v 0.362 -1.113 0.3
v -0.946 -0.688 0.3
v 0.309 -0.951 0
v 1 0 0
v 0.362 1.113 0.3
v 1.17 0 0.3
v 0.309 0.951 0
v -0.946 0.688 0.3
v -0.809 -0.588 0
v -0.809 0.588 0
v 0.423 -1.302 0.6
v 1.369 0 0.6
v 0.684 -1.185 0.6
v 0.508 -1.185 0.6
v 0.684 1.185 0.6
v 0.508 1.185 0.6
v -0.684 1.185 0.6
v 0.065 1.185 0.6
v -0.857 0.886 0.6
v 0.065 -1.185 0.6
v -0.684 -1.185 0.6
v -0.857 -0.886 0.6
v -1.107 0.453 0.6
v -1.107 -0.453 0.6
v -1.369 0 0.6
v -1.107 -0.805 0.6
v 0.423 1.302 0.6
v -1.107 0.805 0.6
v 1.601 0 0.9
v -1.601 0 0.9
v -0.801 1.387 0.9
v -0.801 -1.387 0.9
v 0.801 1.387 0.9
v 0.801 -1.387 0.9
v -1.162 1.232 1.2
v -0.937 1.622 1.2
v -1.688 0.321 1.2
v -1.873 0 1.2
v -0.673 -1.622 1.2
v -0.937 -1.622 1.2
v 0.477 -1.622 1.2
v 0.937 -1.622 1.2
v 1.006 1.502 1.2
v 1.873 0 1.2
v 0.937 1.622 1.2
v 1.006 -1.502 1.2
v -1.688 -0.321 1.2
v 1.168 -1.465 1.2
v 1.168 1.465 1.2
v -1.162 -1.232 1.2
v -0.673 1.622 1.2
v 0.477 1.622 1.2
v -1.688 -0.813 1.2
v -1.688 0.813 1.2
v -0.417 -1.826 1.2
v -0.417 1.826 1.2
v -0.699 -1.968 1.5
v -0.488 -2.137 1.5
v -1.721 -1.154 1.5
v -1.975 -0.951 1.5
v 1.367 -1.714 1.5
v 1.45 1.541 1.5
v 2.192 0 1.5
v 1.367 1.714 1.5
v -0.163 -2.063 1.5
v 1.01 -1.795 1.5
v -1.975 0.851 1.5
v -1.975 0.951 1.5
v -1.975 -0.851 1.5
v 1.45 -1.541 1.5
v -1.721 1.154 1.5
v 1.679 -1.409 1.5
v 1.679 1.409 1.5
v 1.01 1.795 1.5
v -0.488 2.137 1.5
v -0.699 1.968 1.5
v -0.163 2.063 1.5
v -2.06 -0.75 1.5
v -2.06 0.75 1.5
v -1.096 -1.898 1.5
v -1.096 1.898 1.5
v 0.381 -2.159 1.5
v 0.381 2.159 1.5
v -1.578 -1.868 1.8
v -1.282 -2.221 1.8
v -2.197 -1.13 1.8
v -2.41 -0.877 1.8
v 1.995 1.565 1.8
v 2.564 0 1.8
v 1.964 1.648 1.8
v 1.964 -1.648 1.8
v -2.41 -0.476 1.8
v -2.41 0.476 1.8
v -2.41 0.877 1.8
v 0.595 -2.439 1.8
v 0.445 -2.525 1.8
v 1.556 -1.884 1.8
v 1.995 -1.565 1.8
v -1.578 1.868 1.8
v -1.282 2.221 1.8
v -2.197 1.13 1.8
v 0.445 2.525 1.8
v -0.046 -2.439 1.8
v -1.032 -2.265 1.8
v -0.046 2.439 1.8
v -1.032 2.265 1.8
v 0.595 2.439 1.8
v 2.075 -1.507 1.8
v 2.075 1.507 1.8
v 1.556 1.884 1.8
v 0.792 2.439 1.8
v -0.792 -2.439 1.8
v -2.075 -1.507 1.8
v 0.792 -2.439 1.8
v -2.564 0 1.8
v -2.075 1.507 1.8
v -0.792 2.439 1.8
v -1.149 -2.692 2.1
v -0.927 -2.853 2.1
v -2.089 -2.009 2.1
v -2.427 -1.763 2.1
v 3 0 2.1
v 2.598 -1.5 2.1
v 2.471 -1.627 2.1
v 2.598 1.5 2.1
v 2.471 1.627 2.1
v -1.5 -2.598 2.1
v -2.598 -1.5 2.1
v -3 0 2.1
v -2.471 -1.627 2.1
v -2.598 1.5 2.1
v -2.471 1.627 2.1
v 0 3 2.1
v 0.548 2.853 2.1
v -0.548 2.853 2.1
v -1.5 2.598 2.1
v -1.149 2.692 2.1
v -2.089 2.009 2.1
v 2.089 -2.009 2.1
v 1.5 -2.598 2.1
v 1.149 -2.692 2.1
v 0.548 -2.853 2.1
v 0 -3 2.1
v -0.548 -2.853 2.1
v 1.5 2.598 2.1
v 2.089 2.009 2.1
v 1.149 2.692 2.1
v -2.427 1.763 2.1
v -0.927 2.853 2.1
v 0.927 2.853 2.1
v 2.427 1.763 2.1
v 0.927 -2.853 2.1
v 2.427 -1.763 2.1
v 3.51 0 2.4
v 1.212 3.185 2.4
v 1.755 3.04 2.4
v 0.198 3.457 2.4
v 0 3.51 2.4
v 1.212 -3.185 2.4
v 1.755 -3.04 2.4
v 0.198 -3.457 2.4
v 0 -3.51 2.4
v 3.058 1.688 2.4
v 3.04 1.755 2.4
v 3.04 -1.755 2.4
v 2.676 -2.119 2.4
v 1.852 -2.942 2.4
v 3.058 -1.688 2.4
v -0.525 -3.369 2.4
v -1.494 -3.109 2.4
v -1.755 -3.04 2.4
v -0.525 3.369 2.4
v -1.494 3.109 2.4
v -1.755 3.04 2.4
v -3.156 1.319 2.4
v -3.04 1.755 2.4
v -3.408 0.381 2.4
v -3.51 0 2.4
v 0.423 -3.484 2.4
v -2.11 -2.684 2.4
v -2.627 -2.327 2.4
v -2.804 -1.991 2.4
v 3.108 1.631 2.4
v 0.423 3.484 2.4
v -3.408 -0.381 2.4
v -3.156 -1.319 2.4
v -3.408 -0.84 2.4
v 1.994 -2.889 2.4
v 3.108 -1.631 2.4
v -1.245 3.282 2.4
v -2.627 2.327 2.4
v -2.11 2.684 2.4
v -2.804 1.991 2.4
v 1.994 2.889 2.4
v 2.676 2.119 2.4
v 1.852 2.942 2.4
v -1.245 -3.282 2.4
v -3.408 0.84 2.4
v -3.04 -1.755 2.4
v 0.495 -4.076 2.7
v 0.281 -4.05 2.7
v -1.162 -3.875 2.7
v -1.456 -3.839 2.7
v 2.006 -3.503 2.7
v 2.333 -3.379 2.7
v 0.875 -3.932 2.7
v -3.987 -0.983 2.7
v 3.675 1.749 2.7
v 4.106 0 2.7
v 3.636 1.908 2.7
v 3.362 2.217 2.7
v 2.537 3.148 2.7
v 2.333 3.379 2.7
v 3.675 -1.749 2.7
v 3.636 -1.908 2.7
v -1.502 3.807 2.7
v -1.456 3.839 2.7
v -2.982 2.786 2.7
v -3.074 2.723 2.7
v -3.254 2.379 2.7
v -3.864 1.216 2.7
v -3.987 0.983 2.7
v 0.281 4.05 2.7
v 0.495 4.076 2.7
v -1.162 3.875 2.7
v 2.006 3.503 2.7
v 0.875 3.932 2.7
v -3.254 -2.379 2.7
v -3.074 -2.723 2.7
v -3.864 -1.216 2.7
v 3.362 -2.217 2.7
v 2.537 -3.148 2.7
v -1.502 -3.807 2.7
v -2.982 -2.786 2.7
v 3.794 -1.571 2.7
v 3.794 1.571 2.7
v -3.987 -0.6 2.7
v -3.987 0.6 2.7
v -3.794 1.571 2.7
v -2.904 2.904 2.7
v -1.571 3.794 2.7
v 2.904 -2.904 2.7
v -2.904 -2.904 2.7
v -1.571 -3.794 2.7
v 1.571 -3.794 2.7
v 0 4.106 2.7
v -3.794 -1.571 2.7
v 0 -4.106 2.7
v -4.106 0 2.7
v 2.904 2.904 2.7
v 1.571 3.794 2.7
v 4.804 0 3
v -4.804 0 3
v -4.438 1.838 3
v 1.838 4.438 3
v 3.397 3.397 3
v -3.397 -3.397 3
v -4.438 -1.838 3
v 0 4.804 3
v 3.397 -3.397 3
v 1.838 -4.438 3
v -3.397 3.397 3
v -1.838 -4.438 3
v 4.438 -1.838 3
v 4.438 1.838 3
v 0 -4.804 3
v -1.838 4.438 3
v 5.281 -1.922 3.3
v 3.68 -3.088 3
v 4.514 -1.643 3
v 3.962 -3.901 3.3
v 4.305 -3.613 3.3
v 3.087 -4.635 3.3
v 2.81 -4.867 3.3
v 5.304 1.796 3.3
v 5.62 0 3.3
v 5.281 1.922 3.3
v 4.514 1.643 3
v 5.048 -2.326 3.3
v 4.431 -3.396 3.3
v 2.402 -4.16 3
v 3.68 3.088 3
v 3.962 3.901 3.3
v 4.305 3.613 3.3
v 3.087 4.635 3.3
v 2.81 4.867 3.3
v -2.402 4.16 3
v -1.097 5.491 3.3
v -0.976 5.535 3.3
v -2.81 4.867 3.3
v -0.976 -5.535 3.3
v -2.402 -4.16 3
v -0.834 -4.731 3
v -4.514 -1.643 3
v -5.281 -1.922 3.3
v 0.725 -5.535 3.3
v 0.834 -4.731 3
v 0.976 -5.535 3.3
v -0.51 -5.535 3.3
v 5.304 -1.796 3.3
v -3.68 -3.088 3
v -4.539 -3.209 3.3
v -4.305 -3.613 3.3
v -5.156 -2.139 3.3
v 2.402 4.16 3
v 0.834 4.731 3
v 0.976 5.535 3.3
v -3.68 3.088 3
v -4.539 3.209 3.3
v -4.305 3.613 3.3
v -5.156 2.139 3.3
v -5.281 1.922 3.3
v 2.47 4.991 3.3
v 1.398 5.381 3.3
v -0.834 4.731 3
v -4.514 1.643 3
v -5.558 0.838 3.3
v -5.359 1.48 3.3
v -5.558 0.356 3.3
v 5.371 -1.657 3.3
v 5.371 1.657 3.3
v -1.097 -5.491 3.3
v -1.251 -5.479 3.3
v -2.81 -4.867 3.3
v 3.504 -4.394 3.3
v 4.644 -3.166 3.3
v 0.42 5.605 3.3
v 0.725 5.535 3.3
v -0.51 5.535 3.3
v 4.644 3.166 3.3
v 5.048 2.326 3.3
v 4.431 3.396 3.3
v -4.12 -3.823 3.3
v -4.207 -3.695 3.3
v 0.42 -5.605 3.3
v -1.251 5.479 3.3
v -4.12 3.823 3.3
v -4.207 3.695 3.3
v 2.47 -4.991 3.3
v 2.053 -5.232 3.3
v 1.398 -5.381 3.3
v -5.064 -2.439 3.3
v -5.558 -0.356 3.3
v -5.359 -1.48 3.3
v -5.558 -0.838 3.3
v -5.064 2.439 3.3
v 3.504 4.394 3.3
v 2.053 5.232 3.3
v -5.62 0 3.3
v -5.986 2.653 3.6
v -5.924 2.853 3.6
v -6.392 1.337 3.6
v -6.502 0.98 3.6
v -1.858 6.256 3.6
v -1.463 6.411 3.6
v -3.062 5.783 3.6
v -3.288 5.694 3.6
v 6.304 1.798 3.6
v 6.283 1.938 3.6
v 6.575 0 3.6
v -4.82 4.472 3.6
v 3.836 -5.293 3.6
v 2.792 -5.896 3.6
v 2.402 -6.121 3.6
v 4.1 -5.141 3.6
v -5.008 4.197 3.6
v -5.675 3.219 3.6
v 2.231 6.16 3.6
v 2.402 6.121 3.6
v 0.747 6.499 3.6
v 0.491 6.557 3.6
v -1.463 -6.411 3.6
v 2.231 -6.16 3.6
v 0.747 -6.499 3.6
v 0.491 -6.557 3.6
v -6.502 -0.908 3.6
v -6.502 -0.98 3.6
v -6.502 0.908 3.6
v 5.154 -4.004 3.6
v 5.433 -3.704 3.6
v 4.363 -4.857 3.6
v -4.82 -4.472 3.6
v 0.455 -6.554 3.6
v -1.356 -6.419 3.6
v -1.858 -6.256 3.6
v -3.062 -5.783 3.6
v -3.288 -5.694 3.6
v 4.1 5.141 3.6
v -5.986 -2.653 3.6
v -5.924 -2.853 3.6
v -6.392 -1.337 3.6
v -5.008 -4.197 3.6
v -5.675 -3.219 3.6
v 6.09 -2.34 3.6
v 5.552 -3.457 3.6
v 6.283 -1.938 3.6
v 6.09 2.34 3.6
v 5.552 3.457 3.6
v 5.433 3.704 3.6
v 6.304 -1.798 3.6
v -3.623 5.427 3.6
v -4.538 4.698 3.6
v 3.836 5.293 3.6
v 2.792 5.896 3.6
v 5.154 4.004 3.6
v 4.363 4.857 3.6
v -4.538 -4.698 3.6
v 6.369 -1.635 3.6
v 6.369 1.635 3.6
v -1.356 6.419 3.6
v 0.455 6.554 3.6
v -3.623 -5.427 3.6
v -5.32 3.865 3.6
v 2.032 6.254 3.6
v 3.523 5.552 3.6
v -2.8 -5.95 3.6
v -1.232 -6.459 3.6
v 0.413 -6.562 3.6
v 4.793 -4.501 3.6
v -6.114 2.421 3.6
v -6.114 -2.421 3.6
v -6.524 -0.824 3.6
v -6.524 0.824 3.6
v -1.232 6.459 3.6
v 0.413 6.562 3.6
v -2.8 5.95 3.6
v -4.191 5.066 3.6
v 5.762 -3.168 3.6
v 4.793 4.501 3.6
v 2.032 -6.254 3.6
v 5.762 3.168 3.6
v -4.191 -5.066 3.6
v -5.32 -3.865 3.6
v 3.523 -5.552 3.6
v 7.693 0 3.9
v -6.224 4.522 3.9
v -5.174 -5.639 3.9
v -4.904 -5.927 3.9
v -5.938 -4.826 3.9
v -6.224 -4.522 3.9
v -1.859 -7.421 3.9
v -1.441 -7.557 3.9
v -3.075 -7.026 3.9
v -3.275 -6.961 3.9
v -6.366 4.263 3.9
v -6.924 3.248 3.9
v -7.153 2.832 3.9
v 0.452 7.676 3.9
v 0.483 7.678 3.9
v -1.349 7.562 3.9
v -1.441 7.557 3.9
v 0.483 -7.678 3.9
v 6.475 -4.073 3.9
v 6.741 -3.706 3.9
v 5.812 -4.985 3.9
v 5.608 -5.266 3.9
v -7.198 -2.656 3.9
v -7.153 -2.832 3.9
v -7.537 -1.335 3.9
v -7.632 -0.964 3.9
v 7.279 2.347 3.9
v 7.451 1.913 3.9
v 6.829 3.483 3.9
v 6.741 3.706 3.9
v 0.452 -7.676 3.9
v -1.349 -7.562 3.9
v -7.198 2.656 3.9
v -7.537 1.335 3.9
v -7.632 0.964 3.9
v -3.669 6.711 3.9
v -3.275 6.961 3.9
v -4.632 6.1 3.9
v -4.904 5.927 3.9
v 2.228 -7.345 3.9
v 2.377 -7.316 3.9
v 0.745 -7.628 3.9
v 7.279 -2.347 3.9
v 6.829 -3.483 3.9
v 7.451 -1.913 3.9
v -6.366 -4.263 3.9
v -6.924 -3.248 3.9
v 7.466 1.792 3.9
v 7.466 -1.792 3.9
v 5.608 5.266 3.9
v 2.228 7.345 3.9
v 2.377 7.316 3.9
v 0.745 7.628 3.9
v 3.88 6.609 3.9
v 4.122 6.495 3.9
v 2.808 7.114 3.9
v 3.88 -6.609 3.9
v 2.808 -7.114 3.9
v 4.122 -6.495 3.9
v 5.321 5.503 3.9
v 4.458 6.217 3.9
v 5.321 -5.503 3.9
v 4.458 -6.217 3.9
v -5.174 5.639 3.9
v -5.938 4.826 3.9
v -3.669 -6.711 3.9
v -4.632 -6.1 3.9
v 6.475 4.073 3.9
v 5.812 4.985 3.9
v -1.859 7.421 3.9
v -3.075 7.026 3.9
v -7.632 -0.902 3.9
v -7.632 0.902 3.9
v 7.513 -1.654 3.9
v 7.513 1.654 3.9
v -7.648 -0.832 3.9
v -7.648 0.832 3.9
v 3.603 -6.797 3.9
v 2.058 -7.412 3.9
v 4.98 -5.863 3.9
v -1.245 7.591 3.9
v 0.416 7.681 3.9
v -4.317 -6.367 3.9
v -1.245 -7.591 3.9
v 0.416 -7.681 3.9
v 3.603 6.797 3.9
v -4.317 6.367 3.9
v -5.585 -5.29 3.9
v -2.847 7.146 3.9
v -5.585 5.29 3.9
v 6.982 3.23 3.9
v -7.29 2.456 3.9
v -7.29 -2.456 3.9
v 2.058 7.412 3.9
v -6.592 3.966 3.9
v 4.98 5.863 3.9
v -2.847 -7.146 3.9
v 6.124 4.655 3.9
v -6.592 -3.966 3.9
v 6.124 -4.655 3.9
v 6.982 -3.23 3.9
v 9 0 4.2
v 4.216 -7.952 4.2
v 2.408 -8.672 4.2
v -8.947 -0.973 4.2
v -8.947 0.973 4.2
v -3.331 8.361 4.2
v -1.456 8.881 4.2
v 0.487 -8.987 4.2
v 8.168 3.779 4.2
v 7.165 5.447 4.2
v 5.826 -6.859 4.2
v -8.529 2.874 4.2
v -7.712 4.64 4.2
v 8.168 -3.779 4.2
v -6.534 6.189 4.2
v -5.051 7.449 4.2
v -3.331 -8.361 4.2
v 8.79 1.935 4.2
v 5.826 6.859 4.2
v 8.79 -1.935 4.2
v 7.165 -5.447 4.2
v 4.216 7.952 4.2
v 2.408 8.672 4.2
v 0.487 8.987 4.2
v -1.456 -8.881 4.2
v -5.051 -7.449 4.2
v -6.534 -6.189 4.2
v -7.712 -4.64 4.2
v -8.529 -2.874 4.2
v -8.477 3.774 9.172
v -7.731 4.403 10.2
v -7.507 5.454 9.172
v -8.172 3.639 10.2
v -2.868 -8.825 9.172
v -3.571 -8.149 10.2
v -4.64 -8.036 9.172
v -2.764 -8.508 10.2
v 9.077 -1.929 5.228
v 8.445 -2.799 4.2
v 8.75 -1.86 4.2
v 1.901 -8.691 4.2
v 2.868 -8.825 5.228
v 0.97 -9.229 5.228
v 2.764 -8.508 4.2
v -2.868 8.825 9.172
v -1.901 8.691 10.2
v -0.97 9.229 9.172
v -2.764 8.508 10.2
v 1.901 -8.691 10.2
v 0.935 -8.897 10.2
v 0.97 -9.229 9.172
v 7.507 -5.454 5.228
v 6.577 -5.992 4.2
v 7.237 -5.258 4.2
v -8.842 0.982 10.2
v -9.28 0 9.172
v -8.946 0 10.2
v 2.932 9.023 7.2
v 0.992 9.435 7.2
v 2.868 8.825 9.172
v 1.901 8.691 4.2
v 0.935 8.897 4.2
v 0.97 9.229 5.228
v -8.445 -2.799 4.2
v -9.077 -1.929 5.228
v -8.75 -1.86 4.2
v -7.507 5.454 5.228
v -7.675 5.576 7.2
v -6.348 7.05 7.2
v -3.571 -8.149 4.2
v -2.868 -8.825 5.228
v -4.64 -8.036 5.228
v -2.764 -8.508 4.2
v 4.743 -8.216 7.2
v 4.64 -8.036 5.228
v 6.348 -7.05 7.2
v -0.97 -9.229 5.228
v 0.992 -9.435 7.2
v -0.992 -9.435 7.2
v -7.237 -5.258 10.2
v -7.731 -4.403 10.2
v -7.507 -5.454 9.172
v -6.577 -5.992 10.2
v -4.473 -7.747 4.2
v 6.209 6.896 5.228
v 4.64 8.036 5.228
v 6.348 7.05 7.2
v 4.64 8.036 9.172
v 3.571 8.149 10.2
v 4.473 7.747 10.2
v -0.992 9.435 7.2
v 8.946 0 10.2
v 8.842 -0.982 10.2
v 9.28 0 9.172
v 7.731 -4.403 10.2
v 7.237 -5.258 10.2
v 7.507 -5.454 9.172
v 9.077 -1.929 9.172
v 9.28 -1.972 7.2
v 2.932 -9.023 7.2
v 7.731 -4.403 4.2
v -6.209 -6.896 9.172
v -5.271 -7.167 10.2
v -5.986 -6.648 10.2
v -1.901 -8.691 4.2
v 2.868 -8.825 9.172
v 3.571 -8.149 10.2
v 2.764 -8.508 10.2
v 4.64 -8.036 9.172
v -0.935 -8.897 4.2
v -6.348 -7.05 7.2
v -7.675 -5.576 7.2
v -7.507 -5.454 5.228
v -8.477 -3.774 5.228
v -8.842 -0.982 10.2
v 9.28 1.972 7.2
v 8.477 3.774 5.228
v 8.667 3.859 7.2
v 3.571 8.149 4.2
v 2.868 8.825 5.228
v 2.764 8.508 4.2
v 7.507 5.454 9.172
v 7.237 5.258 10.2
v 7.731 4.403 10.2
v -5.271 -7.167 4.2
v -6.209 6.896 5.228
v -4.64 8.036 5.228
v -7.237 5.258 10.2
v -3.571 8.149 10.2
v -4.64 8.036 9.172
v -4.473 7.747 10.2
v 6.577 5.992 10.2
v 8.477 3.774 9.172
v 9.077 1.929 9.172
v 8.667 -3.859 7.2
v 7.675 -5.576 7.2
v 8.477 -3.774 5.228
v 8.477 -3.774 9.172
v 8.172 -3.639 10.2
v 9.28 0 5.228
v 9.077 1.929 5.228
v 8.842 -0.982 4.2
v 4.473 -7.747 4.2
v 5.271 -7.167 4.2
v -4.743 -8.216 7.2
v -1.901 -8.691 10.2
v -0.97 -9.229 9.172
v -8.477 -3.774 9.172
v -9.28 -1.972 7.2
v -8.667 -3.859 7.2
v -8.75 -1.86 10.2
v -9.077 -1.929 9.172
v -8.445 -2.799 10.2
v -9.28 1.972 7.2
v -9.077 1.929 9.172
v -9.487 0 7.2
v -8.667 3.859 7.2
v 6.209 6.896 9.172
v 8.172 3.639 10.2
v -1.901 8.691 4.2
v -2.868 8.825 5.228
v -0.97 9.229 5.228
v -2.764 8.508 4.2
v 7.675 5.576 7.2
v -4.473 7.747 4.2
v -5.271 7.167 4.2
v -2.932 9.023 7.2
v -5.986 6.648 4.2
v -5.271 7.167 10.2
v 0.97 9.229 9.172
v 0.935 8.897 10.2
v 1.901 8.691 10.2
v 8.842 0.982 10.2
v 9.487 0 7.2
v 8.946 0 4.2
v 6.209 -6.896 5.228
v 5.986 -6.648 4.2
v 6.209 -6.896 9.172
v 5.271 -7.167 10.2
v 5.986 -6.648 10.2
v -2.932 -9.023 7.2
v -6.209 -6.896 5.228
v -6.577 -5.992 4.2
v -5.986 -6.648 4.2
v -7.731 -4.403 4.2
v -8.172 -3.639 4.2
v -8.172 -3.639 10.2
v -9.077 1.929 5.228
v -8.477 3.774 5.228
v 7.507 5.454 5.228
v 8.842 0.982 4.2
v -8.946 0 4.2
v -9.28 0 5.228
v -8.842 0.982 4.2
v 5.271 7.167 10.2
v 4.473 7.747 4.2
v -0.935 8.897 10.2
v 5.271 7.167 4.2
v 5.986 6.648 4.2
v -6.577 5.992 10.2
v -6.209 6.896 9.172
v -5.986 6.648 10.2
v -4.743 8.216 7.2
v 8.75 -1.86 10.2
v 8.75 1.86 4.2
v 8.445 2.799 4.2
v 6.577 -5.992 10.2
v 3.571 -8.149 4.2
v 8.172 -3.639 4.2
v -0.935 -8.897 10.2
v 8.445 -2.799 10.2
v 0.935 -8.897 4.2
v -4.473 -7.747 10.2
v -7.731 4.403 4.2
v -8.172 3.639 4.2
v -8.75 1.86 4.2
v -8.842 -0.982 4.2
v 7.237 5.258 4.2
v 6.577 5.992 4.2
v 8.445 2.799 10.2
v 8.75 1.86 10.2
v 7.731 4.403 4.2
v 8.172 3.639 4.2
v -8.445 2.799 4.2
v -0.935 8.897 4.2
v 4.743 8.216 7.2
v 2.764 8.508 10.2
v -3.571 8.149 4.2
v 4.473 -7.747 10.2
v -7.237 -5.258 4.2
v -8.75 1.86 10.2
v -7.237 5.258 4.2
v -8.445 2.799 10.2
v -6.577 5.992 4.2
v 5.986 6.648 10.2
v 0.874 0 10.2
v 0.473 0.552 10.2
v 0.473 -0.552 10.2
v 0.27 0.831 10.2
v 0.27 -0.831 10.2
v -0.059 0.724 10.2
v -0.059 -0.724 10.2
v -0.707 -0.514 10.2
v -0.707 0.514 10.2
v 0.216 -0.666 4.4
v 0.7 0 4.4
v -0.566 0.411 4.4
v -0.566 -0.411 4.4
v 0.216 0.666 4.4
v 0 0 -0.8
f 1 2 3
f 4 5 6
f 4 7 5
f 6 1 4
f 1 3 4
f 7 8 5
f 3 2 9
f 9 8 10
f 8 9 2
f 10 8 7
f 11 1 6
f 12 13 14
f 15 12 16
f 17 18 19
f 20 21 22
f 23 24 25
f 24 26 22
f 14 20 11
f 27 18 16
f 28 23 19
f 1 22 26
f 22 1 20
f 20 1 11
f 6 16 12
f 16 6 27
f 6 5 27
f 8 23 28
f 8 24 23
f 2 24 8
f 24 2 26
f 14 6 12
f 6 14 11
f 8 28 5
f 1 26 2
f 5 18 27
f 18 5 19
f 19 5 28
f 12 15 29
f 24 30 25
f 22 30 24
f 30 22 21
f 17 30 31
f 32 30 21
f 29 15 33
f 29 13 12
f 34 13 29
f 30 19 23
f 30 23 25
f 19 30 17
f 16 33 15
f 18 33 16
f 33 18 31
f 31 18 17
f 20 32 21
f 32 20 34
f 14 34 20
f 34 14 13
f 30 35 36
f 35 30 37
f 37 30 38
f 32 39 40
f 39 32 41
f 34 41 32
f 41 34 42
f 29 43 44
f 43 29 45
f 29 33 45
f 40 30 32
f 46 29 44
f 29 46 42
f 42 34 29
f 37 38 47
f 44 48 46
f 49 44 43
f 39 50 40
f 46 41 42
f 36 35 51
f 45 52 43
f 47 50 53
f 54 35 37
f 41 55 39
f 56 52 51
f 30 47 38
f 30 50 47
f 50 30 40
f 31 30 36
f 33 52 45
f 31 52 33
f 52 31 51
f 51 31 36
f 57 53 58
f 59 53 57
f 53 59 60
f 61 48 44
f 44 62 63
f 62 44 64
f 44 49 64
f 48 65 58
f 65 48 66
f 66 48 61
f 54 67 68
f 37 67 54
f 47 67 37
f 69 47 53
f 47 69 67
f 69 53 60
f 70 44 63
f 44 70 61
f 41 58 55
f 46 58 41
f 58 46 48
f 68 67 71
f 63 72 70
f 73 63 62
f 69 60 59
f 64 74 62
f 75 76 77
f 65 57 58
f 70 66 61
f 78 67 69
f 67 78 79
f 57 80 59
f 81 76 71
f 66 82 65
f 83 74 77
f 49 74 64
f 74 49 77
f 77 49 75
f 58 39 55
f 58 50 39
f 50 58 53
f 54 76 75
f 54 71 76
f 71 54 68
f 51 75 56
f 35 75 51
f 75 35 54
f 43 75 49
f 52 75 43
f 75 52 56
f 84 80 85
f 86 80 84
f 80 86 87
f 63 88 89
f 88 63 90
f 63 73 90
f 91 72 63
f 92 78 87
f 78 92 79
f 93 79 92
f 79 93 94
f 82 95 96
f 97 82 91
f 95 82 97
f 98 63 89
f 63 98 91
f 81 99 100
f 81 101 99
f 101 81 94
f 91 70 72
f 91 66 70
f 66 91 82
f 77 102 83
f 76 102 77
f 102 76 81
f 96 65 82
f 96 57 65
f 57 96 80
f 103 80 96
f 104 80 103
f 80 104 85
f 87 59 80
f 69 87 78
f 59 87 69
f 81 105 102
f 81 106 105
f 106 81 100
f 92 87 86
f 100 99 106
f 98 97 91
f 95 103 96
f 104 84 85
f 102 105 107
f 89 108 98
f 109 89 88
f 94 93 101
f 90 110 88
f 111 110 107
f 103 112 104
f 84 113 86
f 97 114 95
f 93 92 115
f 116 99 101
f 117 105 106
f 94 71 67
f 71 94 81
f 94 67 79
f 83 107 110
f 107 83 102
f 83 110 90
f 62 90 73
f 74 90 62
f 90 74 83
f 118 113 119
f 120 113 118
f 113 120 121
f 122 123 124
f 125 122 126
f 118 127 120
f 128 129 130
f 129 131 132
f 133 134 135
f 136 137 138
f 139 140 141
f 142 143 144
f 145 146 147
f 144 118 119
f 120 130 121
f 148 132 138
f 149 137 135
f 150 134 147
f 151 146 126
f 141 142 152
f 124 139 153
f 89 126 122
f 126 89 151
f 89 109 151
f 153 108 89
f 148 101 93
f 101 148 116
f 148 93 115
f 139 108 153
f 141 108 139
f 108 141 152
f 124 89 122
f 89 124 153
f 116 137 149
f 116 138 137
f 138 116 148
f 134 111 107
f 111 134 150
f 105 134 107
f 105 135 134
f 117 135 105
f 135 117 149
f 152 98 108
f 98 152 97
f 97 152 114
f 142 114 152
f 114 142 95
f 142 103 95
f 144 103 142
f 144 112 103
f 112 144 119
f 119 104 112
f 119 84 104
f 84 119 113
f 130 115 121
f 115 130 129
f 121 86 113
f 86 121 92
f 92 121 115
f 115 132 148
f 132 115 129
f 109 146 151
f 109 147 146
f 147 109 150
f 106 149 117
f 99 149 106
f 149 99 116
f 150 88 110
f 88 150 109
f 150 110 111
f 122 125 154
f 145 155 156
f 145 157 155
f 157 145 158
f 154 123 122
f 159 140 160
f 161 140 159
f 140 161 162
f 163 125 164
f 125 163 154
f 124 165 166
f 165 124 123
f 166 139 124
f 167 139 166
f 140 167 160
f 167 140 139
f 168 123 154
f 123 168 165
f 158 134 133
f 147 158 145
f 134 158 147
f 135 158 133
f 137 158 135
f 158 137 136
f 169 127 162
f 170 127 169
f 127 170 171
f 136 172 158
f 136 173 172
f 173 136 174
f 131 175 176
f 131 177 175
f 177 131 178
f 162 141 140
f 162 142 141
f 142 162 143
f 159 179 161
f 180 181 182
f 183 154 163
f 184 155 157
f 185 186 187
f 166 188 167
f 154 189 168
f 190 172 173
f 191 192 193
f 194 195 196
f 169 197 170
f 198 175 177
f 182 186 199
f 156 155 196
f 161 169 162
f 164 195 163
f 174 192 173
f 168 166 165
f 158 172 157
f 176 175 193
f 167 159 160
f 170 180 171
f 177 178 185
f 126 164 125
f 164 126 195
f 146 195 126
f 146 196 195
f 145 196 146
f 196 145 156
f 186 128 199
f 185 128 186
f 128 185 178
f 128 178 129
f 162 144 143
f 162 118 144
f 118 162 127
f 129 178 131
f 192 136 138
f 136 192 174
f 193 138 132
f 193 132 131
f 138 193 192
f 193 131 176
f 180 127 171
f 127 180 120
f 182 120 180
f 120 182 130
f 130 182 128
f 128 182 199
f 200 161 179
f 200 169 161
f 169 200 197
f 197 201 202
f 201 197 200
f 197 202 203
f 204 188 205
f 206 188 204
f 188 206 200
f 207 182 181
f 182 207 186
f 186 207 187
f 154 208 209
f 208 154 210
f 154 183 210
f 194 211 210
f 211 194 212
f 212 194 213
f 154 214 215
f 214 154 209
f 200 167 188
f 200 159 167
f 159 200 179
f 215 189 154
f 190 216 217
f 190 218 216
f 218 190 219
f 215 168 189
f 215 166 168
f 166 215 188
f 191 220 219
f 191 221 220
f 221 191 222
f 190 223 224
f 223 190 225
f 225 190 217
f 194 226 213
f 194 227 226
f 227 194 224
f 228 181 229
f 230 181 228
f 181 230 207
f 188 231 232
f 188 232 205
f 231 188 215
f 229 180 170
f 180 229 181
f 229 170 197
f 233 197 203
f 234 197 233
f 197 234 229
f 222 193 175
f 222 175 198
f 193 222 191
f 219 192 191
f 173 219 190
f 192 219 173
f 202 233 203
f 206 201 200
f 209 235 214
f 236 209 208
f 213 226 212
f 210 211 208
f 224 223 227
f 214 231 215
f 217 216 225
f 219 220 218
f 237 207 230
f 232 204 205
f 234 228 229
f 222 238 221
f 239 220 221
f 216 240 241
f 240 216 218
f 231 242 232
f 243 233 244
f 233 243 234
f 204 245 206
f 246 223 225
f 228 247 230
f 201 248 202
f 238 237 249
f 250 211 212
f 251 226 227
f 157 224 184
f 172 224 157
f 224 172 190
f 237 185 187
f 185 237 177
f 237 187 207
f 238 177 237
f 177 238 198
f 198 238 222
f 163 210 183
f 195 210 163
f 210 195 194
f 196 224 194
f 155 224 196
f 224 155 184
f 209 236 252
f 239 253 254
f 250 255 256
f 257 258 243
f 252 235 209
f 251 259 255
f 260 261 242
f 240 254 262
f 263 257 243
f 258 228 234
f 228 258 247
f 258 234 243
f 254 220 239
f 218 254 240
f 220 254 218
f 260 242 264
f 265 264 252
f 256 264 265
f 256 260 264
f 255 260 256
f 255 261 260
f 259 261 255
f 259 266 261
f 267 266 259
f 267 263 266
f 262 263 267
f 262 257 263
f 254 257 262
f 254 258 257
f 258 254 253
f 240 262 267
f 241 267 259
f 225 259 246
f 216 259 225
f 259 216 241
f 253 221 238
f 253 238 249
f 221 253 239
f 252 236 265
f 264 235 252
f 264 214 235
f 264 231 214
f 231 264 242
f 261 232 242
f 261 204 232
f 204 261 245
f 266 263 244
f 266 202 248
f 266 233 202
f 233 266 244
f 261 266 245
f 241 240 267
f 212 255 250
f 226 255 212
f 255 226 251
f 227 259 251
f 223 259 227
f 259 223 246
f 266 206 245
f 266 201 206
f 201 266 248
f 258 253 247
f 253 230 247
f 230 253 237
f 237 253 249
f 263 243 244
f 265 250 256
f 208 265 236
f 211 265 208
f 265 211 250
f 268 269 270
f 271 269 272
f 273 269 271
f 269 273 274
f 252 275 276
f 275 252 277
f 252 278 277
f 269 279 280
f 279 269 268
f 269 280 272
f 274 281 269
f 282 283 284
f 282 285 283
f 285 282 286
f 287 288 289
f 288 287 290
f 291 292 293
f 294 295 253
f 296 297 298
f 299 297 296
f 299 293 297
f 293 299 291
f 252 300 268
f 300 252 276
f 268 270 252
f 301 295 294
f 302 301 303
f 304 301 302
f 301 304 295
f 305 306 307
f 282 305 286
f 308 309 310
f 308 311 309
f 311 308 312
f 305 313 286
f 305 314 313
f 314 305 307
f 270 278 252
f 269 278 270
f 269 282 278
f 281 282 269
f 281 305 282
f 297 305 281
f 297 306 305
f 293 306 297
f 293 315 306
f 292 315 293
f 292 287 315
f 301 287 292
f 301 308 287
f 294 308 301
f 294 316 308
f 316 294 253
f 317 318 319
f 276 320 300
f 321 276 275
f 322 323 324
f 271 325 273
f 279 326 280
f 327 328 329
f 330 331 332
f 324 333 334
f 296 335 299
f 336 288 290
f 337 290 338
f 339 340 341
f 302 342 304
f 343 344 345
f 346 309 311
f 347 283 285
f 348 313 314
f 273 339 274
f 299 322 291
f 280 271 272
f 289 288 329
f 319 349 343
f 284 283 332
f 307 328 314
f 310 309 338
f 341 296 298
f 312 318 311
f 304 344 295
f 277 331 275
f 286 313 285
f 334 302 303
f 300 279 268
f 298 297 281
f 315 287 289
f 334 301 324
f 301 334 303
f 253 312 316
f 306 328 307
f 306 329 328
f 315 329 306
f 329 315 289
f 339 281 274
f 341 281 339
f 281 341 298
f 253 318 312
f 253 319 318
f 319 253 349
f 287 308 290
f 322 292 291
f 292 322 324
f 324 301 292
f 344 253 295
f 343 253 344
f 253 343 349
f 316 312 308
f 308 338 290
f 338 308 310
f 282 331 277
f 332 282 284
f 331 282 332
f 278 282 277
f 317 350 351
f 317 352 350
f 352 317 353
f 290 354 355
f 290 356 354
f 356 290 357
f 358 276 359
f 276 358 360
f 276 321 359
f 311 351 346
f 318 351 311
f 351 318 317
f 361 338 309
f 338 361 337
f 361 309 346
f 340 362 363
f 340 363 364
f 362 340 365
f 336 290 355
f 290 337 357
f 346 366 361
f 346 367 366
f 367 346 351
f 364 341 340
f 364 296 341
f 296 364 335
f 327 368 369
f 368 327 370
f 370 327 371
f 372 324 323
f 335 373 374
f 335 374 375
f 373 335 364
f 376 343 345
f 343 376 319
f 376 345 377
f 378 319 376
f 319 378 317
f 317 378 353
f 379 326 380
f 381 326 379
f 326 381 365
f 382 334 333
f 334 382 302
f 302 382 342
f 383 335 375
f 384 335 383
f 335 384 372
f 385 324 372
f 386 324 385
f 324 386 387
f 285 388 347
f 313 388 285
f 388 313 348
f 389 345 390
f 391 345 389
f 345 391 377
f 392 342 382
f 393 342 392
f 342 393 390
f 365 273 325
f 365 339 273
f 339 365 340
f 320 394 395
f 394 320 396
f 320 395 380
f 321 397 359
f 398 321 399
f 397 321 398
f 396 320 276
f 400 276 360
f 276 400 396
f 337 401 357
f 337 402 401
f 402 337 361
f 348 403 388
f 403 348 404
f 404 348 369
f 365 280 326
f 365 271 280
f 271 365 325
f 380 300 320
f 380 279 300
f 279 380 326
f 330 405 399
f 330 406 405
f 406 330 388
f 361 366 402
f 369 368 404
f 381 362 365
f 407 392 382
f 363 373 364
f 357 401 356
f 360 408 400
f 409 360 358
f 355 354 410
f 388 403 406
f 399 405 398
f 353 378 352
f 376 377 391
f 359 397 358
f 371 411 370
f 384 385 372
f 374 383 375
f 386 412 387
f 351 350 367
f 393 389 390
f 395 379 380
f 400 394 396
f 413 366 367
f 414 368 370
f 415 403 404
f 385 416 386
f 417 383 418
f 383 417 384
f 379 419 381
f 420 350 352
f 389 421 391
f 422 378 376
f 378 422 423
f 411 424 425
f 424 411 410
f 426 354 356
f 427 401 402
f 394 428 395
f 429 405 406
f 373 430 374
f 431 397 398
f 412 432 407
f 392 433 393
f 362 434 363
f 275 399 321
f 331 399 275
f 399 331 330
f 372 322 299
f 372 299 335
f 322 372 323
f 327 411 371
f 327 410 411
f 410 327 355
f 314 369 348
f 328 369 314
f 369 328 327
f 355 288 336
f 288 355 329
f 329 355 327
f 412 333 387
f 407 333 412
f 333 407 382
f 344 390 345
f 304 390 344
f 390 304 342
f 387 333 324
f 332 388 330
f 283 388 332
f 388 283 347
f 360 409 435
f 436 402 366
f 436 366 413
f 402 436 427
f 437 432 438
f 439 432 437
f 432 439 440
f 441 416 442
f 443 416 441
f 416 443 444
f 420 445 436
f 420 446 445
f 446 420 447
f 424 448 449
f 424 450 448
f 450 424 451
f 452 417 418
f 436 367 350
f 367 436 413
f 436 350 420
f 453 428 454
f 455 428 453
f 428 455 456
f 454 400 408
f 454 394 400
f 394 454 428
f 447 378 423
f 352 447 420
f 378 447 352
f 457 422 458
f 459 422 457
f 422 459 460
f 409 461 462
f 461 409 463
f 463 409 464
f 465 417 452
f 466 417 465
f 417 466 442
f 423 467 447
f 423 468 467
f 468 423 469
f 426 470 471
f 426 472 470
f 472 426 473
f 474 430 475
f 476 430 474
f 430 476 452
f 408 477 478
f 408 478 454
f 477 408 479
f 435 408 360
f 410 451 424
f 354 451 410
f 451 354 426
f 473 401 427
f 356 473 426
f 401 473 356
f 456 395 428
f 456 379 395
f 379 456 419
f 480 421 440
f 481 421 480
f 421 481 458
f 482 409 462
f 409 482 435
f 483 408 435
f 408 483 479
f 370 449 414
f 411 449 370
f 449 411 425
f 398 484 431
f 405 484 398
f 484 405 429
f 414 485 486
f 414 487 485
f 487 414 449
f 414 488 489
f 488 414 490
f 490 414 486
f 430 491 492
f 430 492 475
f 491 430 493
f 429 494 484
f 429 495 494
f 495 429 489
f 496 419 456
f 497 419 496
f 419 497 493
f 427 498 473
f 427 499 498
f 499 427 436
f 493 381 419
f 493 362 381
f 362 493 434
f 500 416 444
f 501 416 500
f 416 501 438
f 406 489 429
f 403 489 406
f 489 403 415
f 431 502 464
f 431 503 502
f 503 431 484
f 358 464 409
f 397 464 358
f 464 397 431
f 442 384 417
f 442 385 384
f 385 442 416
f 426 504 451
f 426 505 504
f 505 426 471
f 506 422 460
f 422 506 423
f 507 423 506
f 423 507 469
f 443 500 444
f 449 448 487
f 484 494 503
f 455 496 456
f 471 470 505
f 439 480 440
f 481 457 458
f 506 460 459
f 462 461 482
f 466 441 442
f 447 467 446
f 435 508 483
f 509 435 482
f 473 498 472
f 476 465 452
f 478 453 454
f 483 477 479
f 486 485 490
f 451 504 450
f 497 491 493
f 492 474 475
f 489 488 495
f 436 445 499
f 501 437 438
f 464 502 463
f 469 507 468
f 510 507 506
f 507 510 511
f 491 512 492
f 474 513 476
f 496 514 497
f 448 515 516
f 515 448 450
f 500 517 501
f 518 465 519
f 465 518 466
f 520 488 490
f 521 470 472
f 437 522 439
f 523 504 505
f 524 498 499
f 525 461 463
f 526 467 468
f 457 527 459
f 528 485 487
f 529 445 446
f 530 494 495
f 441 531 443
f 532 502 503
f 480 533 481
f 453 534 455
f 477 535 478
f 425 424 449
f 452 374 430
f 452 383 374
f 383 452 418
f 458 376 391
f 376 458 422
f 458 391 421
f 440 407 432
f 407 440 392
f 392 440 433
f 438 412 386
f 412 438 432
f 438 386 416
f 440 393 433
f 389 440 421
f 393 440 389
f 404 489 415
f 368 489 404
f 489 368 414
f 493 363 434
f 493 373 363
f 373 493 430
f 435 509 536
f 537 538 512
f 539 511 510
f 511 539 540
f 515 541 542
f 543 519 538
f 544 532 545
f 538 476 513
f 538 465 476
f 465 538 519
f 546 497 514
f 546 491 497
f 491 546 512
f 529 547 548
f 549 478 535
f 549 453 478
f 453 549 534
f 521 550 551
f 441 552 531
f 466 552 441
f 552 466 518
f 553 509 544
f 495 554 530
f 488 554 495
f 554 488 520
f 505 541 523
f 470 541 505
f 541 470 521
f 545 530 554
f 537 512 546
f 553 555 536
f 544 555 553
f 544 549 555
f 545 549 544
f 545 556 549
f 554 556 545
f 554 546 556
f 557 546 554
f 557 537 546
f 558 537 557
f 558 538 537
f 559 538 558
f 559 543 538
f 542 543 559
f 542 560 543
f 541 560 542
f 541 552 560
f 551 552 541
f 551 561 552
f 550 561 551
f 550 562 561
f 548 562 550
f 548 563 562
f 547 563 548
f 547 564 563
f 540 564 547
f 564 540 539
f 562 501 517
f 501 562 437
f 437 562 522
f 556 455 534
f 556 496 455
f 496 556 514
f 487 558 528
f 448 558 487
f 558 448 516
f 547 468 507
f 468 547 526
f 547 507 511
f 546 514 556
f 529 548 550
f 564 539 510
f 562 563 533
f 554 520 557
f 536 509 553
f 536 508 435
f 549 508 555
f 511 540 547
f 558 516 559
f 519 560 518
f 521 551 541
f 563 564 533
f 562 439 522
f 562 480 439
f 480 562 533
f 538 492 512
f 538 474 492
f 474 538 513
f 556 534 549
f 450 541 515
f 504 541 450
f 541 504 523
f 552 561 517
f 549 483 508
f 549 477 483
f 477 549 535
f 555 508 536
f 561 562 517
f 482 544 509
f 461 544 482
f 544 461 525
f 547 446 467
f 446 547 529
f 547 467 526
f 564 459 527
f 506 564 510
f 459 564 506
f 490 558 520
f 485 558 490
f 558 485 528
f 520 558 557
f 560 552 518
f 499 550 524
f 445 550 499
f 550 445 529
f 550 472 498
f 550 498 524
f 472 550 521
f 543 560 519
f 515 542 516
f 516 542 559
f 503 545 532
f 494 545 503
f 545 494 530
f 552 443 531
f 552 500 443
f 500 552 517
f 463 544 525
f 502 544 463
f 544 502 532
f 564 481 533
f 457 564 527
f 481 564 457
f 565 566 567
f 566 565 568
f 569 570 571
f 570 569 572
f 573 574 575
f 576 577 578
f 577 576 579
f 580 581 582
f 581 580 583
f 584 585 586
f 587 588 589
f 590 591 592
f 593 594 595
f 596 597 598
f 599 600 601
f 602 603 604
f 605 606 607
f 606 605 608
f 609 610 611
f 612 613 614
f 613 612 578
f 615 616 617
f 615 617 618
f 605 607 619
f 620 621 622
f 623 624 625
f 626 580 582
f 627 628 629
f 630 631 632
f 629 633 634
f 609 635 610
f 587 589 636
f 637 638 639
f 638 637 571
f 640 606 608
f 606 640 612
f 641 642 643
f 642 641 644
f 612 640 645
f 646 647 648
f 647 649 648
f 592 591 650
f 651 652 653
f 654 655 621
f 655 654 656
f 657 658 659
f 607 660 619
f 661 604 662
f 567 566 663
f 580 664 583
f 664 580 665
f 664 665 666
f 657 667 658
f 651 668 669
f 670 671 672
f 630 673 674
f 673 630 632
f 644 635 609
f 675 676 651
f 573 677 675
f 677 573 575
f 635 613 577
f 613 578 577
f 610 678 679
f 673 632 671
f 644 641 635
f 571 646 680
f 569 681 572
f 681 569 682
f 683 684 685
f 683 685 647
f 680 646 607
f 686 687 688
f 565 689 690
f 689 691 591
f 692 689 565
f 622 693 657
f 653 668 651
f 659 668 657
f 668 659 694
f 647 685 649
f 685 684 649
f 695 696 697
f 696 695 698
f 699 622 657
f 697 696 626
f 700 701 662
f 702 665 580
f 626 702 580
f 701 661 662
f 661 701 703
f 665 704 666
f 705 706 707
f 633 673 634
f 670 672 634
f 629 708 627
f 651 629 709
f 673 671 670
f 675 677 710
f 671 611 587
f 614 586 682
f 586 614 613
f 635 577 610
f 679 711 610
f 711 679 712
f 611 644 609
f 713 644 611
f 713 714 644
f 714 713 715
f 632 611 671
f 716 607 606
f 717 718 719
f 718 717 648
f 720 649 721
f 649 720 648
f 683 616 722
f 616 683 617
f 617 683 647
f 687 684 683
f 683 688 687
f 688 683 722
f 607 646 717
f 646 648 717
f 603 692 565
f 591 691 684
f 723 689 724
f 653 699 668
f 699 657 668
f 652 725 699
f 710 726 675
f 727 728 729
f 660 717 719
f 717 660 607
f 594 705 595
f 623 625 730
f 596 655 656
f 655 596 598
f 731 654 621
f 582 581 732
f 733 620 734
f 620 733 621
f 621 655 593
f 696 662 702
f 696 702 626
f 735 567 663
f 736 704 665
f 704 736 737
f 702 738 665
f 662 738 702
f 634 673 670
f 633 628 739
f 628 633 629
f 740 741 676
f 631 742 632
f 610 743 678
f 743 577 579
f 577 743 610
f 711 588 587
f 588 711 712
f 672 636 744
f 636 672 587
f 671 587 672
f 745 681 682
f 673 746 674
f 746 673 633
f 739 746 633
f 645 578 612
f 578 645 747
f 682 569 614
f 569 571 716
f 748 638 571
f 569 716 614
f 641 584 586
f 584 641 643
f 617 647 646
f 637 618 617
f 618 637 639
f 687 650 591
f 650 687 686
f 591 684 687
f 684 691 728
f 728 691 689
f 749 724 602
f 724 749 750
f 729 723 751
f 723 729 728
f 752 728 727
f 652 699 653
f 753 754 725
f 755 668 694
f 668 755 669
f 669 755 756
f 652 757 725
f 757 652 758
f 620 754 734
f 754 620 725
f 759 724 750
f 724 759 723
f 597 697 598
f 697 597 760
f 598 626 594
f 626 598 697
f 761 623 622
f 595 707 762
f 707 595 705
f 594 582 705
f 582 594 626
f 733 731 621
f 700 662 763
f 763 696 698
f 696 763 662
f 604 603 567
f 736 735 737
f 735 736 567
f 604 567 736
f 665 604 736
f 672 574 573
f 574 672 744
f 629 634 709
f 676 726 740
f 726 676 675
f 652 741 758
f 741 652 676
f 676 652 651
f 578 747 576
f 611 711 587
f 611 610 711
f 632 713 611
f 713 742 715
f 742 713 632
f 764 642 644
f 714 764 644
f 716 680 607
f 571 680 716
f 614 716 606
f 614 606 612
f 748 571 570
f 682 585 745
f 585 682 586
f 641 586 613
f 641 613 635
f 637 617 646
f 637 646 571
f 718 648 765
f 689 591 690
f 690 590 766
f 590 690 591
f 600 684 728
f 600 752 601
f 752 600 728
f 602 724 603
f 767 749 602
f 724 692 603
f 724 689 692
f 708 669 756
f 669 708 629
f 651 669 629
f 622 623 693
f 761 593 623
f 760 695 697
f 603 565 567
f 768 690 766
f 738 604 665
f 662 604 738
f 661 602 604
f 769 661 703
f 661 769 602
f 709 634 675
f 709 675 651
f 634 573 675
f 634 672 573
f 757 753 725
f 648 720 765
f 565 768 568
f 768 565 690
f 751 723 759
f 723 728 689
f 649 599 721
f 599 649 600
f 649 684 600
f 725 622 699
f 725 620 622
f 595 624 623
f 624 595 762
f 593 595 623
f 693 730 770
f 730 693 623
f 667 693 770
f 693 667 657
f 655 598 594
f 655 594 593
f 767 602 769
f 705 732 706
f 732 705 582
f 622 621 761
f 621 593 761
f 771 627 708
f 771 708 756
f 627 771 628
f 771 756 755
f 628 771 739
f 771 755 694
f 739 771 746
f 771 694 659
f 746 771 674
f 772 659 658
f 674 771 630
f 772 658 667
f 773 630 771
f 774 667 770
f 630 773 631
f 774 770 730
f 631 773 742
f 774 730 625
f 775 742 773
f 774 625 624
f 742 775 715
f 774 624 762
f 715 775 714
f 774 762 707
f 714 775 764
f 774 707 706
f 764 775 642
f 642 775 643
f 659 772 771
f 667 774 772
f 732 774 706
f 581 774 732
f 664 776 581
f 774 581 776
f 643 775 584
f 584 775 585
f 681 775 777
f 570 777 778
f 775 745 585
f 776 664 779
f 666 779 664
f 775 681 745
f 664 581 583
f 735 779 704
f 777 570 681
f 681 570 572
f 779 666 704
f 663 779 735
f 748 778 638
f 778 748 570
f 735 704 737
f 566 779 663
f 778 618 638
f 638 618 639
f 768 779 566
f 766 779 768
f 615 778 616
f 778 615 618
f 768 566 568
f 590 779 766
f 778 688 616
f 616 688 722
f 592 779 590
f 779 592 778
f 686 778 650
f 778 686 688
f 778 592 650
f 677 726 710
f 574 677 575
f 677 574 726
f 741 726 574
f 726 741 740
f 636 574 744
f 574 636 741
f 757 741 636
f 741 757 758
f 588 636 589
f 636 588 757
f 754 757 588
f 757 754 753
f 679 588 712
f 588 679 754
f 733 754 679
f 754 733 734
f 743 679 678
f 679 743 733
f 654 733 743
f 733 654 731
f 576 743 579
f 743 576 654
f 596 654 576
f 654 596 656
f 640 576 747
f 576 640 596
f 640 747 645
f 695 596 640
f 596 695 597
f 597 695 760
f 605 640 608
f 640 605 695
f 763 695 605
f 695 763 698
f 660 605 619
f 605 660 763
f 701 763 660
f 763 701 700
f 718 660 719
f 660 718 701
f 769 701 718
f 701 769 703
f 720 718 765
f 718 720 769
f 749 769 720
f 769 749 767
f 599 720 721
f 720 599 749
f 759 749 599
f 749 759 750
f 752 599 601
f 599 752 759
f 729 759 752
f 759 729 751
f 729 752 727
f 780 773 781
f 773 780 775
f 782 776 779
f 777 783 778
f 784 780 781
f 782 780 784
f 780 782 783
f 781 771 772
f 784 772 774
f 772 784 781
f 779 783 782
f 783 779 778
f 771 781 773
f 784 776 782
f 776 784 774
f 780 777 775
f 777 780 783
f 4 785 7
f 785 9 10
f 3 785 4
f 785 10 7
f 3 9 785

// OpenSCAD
/* 
	first param: height of the lower part (0.3 * n)
	second param: radius of the border between sphere and lower part
	third param: height of the spheric part
*/

module kreisel(h, r1, x) {
		for(i = [0:0.3:(h-0.3)]) {
			translate([0,0,i]) cylinder(0.3,exp(i/h*ln(r1)), exp(((i+0.3)/h*ln(r1))));
		}
		translate([0,0,-0.8]) cylinder(0.8, 0, 1);

		alpha = atan(r1 / x);
		r = r1 / sin(alpha);

		translate([0,0,h + x]) difference() {
			sphere(r);
			translate([-r, -r, x]) cube(2 * r);
			translate([-r, -r, -x - 2*r]) cube(2 * r);
			translate([0, 0, h + x - 10]) cylinder(10, 0.7);
		}
}

kreisel(4.2, 9, 3);
